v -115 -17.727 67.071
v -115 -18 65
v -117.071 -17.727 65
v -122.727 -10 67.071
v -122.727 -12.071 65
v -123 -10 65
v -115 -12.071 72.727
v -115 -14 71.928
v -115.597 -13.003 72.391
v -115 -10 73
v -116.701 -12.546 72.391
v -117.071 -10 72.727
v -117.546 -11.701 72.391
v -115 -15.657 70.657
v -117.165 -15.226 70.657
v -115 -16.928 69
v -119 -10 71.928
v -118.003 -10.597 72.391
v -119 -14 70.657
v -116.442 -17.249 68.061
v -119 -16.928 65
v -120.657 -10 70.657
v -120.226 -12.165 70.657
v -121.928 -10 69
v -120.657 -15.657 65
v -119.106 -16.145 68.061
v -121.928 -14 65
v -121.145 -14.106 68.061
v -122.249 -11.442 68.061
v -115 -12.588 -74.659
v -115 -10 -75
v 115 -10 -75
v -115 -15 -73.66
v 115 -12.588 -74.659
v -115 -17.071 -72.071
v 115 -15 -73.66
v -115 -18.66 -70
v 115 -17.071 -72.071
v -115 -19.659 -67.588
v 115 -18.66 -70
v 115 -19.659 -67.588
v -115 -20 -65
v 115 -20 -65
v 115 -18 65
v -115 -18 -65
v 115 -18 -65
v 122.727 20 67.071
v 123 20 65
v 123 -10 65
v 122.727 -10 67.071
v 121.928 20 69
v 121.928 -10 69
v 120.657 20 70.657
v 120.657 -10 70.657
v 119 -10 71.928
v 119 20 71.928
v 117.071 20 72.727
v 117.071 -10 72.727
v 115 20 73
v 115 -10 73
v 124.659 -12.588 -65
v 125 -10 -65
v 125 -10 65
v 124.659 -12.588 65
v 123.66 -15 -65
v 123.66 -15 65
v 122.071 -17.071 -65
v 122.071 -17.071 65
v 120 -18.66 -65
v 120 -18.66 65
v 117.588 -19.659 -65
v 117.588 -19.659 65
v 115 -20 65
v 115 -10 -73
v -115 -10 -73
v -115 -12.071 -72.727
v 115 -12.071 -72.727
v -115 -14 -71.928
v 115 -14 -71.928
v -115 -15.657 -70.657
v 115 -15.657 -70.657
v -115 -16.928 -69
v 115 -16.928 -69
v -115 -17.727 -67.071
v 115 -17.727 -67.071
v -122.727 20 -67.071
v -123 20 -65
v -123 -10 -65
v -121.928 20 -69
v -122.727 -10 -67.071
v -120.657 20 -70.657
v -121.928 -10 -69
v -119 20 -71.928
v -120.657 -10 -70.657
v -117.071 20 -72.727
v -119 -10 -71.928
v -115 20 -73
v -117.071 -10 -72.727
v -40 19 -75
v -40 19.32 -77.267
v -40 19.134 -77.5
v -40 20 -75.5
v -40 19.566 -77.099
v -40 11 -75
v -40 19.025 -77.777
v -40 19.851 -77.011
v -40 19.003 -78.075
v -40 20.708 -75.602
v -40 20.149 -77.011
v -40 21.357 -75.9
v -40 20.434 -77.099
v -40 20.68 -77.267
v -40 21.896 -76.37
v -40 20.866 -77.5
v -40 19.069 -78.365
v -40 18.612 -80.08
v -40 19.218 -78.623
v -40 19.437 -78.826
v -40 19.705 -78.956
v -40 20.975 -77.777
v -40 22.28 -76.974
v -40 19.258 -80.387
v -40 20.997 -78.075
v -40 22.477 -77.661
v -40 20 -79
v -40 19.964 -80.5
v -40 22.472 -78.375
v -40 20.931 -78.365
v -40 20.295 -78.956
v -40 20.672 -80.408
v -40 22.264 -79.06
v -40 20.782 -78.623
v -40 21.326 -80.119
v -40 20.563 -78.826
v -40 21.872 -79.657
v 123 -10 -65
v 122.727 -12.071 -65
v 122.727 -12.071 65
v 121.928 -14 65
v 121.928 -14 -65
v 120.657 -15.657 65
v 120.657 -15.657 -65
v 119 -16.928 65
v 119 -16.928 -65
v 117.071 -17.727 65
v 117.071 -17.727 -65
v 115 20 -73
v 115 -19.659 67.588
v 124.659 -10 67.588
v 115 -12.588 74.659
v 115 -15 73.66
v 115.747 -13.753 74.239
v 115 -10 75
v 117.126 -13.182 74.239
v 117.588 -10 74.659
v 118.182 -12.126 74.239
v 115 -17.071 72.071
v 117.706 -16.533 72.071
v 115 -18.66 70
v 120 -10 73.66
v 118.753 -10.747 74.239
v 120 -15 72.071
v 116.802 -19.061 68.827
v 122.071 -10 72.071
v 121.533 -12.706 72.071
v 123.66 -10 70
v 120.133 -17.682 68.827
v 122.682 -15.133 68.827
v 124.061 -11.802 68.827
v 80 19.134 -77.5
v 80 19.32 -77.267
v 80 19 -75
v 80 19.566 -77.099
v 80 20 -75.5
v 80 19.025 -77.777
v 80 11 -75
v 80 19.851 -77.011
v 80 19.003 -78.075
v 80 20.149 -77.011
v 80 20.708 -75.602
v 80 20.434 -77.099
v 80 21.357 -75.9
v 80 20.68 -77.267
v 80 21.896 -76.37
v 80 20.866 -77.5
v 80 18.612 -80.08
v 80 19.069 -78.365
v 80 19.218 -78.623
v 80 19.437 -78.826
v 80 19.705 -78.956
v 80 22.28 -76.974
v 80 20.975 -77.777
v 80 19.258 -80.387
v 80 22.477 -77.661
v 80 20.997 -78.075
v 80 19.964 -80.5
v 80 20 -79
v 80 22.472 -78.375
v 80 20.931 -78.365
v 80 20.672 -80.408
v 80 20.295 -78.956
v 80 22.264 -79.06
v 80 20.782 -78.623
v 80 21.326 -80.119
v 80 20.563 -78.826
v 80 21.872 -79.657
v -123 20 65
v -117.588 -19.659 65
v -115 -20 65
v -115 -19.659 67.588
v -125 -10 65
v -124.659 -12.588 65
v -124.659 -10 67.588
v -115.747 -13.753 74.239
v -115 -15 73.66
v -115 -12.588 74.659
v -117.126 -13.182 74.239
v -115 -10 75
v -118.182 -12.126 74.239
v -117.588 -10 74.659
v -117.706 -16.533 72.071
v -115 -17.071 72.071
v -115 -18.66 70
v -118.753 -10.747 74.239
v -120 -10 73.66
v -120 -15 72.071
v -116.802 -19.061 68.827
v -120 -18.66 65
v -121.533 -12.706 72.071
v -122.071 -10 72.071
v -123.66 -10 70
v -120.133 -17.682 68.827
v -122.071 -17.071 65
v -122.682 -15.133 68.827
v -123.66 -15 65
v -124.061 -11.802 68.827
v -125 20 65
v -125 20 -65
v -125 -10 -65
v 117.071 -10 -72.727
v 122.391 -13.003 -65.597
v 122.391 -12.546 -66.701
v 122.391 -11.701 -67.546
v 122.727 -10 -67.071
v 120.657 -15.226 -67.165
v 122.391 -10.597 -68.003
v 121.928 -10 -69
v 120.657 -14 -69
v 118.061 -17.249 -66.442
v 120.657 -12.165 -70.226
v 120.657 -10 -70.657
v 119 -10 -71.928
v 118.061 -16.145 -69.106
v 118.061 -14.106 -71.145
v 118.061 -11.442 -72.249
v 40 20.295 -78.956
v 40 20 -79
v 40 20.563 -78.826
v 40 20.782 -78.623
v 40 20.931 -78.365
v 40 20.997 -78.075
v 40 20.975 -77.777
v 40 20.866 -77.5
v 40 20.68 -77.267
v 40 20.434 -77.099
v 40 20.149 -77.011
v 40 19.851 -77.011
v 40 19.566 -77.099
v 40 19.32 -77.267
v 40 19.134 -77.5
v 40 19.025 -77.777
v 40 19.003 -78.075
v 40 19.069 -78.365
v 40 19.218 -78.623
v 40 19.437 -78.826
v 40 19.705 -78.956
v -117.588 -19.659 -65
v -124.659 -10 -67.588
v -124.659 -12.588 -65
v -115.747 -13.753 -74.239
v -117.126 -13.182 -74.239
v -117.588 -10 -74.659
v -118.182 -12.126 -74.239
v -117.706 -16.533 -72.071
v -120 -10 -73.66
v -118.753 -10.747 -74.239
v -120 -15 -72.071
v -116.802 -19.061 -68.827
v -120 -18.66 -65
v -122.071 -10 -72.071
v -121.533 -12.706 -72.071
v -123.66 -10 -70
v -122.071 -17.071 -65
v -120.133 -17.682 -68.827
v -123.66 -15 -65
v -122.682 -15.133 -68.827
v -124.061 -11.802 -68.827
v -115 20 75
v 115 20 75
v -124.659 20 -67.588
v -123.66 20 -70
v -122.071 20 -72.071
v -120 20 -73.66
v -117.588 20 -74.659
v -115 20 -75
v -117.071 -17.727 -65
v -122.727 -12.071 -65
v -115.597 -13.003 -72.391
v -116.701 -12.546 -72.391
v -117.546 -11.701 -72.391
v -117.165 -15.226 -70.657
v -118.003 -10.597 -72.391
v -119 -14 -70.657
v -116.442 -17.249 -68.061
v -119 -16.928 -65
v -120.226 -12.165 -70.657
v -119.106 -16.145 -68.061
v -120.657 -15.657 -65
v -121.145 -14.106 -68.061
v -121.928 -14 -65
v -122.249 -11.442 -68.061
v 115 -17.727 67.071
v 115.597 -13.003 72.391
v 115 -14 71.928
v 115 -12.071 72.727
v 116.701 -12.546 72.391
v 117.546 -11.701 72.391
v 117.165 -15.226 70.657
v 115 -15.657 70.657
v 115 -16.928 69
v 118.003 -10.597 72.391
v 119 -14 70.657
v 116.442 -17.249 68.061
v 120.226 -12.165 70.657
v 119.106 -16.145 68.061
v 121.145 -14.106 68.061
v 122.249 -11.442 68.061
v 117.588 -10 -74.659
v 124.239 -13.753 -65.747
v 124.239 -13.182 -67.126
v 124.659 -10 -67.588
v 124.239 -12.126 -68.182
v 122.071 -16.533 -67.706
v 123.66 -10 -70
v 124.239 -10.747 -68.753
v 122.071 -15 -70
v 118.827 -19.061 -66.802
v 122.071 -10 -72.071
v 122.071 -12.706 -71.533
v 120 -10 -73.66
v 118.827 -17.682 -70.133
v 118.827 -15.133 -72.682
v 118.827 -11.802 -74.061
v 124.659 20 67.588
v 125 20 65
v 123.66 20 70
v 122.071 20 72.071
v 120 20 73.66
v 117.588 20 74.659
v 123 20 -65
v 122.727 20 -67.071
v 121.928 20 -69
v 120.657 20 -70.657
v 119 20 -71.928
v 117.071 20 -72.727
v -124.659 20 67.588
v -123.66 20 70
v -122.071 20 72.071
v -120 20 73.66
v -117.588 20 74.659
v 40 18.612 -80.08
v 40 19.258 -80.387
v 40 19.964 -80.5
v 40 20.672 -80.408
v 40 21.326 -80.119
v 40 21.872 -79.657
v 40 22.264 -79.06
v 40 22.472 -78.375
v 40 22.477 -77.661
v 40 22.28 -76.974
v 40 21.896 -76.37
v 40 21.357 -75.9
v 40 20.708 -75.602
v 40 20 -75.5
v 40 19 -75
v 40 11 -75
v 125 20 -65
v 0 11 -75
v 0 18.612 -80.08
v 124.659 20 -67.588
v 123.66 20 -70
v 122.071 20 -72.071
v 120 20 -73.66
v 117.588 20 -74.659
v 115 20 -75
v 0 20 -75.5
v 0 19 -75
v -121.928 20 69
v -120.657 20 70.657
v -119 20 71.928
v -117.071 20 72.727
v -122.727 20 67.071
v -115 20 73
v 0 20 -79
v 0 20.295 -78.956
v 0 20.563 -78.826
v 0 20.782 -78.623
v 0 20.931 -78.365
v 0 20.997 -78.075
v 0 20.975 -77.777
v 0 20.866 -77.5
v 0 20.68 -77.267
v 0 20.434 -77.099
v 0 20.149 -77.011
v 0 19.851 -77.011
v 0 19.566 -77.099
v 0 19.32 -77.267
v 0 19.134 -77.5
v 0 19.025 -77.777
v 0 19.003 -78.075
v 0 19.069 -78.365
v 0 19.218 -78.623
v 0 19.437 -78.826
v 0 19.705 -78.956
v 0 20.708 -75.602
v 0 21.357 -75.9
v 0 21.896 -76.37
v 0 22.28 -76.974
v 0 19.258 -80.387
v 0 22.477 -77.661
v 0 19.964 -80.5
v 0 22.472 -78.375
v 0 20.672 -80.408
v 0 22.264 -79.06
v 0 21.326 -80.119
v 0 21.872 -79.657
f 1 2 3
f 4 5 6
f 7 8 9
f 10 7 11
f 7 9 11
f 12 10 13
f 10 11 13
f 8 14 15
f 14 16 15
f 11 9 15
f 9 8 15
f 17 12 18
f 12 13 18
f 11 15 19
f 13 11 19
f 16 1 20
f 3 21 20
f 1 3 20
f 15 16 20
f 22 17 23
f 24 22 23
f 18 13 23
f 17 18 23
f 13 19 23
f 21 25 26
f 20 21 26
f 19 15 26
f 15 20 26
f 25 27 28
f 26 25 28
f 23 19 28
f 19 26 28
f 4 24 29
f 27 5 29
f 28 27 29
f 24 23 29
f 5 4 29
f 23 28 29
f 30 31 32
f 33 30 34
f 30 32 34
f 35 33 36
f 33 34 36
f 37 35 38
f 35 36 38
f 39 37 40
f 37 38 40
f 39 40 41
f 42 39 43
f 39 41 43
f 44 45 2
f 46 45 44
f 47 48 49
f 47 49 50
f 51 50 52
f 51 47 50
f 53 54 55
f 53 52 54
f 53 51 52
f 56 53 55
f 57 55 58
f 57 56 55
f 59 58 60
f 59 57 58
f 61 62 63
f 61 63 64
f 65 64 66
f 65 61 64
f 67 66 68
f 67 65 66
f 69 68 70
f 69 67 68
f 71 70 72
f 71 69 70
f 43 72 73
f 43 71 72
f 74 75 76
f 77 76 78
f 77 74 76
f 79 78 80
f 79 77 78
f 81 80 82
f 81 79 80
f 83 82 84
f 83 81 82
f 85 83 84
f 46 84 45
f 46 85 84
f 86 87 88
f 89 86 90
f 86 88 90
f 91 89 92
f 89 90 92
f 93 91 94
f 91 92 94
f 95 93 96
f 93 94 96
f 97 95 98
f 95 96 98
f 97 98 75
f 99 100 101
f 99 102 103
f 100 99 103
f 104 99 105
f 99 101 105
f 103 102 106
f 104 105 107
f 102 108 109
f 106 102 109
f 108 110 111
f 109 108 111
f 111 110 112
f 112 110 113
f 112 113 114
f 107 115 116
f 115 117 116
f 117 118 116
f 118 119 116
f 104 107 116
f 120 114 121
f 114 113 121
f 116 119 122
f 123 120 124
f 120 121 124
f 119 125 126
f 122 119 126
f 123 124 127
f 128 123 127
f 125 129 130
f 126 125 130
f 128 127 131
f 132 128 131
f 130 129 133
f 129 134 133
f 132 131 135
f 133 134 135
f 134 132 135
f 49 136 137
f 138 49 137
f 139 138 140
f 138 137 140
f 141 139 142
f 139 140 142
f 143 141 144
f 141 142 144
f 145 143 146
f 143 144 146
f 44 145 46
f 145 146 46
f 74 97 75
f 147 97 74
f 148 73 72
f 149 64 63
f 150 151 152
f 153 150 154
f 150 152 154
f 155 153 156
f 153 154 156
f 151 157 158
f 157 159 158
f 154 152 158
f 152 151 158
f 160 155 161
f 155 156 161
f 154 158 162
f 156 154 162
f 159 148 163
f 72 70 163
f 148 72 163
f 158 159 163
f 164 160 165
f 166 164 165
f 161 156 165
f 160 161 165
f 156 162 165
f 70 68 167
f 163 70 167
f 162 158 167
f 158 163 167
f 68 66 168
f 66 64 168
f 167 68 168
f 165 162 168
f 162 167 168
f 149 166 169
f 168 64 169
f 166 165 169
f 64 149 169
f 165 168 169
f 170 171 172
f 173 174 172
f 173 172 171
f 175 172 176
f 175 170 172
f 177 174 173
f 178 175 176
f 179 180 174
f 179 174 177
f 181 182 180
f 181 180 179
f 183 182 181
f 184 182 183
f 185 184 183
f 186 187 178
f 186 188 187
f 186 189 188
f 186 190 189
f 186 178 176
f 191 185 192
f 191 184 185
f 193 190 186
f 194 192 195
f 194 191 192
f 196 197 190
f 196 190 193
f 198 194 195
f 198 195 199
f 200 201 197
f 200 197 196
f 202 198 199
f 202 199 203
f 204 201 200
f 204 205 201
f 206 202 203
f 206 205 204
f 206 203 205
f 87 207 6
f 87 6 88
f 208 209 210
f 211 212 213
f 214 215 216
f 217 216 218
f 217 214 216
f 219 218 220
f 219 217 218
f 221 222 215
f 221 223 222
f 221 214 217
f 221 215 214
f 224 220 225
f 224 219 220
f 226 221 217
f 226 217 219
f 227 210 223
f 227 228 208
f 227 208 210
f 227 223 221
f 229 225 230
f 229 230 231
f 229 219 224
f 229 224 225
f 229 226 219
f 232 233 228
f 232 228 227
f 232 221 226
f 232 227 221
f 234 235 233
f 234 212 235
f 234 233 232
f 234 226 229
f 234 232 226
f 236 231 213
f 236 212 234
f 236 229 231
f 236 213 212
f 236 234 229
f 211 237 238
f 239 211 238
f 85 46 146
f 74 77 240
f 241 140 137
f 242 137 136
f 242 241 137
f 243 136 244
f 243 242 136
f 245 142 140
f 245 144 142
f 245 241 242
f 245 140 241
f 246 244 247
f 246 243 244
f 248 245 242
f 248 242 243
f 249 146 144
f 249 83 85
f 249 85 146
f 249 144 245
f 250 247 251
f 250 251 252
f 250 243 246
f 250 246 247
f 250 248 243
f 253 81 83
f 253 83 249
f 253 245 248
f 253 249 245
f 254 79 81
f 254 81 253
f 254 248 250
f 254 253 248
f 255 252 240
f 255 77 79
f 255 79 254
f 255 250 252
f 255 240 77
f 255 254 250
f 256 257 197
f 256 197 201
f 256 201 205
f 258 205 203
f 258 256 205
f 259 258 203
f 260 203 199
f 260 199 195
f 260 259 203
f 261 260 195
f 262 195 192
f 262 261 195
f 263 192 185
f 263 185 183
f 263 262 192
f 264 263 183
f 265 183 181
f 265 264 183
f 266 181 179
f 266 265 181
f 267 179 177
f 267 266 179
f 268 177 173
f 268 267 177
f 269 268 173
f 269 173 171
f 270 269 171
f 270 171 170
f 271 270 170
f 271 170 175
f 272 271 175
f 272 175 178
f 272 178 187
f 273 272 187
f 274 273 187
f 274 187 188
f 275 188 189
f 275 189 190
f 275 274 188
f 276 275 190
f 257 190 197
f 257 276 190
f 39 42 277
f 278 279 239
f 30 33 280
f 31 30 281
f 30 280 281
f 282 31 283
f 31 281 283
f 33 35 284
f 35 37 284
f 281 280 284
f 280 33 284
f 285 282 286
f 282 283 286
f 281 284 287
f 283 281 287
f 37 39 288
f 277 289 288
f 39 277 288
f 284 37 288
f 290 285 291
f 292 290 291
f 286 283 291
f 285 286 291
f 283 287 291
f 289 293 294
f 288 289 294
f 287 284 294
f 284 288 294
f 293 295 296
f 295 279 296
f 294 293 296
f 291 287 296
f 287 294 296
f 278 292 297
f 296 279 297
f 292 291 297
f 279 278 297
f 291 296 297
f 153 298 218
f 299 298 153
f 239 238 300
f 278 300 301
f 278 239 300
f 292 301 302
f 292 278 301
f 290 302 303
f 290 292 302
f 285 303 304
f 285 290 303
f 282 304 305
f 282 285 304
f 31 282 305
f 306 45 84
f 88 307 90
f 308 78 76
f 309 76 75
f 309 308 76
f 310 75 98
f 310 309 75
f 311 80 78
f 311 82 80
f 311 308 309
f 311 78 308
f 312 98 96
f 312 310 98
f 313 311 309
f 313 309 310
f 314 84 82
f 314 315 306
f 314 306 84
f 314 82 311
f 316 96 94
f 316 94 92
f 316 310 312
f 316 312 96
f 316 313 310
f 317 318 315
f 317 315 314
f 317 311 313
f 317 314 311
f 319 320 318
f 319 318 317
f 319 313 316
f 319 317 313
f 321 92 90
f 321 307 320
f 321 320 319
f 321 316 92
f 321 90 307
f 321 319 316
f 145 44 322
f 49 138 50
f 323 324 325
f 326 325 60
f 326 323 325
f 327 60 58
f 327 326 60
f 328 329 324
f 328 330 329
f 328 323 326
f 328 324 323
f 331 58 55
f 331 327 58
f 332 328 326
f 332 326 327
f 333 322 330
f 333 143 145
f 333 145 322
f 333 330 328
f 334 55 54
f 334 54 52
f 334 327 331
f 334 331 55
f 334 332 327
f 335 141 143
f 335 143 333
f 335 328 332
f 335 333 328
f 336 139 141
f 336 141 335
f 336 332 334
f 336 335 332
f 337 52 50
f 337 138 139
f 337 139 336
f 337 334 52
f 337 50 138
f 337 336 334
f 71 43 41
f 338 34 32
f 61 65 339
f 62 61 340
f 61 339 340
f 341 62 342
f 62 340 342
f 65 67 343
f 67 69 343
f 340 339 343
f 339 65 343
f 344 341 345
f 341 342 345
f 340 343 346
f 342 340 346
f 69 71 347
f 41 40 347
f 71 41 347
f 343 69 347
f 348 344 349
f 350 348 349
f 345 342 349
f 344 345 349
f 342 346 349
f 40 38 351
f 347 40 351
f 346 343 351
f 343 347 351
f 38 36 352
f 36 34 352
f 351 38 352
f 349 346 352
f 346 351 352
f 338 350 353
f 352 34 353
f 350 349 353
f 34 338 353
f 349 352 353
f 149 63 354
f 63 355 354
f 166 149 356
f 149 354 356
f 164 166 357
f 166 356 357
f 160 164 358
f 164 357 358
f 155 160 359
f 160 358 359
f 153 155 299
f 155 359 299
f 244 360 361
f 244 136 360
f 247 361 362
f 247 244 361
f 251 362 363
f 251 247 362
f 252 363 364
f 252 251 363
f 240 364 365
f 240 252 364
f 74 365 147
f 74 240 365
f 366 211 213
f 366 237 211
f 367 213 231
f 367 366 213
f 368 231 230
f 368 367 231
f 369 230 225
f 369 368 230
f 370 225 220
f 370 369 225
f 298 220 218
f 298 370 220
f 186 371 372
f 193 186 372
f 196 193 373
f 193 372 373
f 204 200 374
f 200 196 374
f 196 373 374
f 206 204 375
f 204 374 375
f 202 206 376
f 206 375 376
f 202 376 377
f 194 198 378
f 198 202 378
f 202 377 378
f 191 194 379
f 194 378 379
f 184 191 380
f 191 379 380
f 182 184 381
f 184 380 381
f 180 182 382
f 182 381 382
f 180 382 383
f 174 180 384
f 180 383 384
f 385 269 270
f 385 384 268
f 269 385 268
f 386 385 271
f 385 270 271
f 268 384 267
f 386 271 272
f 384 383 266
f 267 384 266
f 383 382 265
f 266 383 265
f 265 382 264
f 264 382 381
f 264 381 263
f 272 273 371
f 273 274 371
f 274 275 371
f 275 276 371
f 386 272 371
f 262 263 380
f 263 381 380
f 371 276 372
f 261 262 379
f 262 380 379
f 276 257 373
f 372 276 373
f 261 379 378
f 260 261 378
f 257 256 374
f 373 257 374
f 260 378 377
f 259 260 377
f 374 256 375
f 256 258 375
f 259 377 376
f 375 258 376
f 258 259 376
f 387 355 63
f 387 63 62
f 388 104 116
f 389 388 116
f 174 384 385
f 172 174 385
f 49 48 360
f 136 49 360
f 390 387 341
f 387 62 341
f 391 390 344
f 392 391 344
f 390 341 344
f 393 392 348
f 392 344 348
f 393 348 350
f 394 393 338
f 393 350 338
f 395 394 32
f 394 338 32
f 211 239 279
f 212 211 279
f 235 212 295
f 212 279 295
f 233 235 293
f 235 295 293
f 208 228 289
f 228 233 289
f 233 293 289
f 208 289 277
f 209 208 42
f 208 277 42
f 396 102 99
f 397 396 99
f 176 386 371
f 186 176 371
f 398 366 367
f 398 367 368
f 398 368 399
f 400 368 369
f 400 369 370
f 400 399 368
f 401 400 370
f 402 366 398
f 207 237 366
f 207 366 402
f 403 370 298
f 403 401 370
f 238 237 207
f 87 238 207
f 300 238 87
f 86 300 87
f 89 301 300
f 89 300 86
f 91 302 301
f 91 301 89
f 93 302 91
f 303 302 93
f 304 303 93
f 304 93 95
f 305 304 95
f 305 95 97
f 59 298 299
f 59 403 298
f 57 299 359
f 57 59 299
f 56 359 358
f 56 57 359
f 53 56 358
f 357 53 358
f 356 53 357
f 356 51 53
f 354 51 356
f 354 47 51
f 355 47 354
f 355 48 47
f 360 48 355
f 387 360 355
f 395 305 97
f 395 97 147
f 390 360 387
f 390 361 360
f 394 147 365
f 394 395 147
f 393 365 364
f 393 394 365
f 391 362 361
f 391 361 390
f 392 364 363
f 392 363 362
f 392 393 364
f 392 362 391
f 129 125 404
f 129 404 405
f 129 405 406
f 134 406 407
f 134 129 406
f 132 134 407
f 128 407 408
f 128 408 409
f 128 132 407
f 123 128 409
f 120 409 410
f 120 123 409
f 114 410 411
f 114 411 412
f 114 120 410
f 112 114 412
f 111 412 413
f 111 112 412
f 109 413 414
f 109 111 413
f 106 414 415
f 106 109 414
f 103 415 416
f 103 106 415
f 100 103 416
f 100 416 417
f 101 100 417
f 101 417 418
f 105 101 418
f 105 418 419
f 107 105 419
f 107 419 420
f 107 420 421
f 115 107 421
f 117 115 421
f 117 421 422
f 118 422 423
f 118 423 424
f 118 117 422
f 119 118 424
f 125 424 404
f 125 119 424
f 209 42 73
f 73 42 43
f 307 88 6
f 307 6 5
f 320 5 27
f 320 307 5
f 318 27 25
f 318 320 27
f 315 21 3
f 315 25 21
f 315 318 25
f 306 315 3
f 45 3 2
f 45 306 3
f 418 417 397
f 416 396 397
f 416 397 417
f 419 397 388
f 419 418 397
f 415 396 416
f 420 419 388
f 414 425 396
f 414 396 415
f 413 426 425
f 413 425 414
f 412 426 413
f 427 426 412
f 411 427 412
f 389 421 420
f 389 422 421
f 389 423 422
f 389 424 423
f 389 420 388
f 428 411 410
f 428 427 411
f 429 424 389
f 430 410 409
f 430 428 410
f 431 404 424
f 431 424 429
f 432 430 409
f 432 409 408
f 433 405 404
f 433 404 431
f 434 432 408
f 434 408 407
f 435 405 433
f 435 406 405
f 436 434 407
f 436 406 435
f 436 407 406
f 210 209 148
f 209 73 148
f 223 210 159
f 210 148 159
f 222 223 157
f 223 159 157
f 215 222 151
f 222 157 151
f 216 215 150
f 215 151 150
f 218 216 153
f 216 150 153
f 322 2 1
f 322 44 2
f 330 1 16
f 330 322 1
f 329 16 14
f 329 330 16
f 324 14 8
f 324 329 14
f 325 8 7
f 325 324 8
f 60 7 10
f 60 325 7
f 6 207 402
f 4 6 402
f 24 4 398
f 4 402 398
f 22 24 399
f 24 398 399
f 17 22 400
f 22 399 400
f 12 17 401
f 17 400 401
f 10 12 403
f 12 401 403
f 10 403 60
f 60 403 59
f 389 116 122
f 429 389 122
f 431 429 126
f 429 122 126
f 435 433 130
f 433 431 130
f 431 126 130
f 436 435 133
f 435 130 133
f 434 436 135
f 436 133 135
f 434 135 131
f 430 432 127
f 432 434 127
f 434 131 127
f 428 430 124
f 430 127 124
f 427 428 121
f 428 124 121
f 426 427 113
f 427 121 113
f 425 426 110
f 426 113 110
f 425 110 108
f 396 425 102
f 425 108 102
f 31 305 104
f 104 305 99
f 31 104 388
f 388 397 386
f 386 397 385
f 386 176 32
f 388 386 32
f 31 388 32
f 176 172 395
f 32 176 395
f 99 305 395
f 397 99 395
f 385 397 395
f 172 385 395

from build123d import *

# Parameters (mm, degrees)
CROQUIS1_W              = 250
CROQUIS1_H              = 150
SALIENTE_EXTRUIR1_DEPTH = 20
REDONDEO1_R             = 10
VACIADO2_T              = -2
SALIENTE_EXTRUIR2_START = 40
CROQUIS2_R              = 1
SALIENTE_EXTRUIR2_DEPTH = 40
SALIENTE_EXTRUIR3_START = -40
CROQUIS2_3_R            = 1
SALIENTE_EXTRUIR3_DEPTH = 40


with BuildPart() as part:
    # Croquis1 → Saliente-Extruir1 (new, symmetric)
    with BuildSketch(Plane(origin=(0, 0, 0), x_dir=(1, 0, 0), z_dir=(0, 1, 0))):
        Rectangle(CROQUIS1_W, CROQUIS1_H)
    extrude(amount=SALIENTE_EXTRUIR1_DEPTH, both=True)

    # Redondeo1
    redondeo1_edges = [part.edges().sort_by_distance(p)[0] for p in [
        (0, -20, -75),
        (-125, 0, -75),
        (125, 0, -75),
        (-125, 0, 75),
        (-125, -20, 0),
        (125, -20, 0),
        (125, 0, 75),
        (0, -20, 75),
    ]]
    fillet(redondeo1_edges, radius=REDONDEO1_R)

    # Vaciado2
    vaciado2_openings = [part.faces().sort_by_distance(p)[0] for p in [
        (0, 20, 0),
    ]]
    offset(amount=VACIADO2_T, openings=vaciado2_openings, kind=Kind.INTERSECTION)

    # Croquis2 → Saliente-Extruir2 (add)
    with BuildSketch(Plane(origin=(0, 0, 0), x_dir=(0, 0, -1), z_dir=(1, 0, 0)).offset(SALIENTE_EXTRUIR2_START)):
        with BuildLine():
            Line((75, 11), (80.079542319, 18.612374783))
            ThreePointArc((80.079542319, 18.612374783), (78.724963517, 22.392577668), (75.5, 20))
            Line((75.5, 20), (75, 19))
            Line((75, 19), (75, 11))
        make_face()
        with Locations((78, 20)):
            Circle(CROQUIS2_R, mode=Mode.SUBTRACT)
    extrude(amount=SALIENTE_EXTRUIR2_DEPTH)

    # Croquis2<3> → Saliente-Extruir3 (add)
    with BuildSketch(Plane(origin=(0, 0, 0), x_dir=(0, 0, -1), z_dir=(1, 0, 0)).offset(SALIENTE_EXTRUIR3_START)):
        with BuildLine():
            Line((75, 11), (80.079542319, 18.612374783))
            ThreePointArc((80.079542319, 18.612374783), (78.724963517, 22.392577668), (75.5, 20))
            Line((75.5, 20), (75, 19))
            Line((75, 19), (75, 11))
        make_face()
        with Locations((78, 20)):
            Circle(CROQUIS2_3_R, mode=Mode.SUBTRACT)
    extrude(amount=SALIENTE_EXTRUIR3_DEPTH)


solid = part.part
